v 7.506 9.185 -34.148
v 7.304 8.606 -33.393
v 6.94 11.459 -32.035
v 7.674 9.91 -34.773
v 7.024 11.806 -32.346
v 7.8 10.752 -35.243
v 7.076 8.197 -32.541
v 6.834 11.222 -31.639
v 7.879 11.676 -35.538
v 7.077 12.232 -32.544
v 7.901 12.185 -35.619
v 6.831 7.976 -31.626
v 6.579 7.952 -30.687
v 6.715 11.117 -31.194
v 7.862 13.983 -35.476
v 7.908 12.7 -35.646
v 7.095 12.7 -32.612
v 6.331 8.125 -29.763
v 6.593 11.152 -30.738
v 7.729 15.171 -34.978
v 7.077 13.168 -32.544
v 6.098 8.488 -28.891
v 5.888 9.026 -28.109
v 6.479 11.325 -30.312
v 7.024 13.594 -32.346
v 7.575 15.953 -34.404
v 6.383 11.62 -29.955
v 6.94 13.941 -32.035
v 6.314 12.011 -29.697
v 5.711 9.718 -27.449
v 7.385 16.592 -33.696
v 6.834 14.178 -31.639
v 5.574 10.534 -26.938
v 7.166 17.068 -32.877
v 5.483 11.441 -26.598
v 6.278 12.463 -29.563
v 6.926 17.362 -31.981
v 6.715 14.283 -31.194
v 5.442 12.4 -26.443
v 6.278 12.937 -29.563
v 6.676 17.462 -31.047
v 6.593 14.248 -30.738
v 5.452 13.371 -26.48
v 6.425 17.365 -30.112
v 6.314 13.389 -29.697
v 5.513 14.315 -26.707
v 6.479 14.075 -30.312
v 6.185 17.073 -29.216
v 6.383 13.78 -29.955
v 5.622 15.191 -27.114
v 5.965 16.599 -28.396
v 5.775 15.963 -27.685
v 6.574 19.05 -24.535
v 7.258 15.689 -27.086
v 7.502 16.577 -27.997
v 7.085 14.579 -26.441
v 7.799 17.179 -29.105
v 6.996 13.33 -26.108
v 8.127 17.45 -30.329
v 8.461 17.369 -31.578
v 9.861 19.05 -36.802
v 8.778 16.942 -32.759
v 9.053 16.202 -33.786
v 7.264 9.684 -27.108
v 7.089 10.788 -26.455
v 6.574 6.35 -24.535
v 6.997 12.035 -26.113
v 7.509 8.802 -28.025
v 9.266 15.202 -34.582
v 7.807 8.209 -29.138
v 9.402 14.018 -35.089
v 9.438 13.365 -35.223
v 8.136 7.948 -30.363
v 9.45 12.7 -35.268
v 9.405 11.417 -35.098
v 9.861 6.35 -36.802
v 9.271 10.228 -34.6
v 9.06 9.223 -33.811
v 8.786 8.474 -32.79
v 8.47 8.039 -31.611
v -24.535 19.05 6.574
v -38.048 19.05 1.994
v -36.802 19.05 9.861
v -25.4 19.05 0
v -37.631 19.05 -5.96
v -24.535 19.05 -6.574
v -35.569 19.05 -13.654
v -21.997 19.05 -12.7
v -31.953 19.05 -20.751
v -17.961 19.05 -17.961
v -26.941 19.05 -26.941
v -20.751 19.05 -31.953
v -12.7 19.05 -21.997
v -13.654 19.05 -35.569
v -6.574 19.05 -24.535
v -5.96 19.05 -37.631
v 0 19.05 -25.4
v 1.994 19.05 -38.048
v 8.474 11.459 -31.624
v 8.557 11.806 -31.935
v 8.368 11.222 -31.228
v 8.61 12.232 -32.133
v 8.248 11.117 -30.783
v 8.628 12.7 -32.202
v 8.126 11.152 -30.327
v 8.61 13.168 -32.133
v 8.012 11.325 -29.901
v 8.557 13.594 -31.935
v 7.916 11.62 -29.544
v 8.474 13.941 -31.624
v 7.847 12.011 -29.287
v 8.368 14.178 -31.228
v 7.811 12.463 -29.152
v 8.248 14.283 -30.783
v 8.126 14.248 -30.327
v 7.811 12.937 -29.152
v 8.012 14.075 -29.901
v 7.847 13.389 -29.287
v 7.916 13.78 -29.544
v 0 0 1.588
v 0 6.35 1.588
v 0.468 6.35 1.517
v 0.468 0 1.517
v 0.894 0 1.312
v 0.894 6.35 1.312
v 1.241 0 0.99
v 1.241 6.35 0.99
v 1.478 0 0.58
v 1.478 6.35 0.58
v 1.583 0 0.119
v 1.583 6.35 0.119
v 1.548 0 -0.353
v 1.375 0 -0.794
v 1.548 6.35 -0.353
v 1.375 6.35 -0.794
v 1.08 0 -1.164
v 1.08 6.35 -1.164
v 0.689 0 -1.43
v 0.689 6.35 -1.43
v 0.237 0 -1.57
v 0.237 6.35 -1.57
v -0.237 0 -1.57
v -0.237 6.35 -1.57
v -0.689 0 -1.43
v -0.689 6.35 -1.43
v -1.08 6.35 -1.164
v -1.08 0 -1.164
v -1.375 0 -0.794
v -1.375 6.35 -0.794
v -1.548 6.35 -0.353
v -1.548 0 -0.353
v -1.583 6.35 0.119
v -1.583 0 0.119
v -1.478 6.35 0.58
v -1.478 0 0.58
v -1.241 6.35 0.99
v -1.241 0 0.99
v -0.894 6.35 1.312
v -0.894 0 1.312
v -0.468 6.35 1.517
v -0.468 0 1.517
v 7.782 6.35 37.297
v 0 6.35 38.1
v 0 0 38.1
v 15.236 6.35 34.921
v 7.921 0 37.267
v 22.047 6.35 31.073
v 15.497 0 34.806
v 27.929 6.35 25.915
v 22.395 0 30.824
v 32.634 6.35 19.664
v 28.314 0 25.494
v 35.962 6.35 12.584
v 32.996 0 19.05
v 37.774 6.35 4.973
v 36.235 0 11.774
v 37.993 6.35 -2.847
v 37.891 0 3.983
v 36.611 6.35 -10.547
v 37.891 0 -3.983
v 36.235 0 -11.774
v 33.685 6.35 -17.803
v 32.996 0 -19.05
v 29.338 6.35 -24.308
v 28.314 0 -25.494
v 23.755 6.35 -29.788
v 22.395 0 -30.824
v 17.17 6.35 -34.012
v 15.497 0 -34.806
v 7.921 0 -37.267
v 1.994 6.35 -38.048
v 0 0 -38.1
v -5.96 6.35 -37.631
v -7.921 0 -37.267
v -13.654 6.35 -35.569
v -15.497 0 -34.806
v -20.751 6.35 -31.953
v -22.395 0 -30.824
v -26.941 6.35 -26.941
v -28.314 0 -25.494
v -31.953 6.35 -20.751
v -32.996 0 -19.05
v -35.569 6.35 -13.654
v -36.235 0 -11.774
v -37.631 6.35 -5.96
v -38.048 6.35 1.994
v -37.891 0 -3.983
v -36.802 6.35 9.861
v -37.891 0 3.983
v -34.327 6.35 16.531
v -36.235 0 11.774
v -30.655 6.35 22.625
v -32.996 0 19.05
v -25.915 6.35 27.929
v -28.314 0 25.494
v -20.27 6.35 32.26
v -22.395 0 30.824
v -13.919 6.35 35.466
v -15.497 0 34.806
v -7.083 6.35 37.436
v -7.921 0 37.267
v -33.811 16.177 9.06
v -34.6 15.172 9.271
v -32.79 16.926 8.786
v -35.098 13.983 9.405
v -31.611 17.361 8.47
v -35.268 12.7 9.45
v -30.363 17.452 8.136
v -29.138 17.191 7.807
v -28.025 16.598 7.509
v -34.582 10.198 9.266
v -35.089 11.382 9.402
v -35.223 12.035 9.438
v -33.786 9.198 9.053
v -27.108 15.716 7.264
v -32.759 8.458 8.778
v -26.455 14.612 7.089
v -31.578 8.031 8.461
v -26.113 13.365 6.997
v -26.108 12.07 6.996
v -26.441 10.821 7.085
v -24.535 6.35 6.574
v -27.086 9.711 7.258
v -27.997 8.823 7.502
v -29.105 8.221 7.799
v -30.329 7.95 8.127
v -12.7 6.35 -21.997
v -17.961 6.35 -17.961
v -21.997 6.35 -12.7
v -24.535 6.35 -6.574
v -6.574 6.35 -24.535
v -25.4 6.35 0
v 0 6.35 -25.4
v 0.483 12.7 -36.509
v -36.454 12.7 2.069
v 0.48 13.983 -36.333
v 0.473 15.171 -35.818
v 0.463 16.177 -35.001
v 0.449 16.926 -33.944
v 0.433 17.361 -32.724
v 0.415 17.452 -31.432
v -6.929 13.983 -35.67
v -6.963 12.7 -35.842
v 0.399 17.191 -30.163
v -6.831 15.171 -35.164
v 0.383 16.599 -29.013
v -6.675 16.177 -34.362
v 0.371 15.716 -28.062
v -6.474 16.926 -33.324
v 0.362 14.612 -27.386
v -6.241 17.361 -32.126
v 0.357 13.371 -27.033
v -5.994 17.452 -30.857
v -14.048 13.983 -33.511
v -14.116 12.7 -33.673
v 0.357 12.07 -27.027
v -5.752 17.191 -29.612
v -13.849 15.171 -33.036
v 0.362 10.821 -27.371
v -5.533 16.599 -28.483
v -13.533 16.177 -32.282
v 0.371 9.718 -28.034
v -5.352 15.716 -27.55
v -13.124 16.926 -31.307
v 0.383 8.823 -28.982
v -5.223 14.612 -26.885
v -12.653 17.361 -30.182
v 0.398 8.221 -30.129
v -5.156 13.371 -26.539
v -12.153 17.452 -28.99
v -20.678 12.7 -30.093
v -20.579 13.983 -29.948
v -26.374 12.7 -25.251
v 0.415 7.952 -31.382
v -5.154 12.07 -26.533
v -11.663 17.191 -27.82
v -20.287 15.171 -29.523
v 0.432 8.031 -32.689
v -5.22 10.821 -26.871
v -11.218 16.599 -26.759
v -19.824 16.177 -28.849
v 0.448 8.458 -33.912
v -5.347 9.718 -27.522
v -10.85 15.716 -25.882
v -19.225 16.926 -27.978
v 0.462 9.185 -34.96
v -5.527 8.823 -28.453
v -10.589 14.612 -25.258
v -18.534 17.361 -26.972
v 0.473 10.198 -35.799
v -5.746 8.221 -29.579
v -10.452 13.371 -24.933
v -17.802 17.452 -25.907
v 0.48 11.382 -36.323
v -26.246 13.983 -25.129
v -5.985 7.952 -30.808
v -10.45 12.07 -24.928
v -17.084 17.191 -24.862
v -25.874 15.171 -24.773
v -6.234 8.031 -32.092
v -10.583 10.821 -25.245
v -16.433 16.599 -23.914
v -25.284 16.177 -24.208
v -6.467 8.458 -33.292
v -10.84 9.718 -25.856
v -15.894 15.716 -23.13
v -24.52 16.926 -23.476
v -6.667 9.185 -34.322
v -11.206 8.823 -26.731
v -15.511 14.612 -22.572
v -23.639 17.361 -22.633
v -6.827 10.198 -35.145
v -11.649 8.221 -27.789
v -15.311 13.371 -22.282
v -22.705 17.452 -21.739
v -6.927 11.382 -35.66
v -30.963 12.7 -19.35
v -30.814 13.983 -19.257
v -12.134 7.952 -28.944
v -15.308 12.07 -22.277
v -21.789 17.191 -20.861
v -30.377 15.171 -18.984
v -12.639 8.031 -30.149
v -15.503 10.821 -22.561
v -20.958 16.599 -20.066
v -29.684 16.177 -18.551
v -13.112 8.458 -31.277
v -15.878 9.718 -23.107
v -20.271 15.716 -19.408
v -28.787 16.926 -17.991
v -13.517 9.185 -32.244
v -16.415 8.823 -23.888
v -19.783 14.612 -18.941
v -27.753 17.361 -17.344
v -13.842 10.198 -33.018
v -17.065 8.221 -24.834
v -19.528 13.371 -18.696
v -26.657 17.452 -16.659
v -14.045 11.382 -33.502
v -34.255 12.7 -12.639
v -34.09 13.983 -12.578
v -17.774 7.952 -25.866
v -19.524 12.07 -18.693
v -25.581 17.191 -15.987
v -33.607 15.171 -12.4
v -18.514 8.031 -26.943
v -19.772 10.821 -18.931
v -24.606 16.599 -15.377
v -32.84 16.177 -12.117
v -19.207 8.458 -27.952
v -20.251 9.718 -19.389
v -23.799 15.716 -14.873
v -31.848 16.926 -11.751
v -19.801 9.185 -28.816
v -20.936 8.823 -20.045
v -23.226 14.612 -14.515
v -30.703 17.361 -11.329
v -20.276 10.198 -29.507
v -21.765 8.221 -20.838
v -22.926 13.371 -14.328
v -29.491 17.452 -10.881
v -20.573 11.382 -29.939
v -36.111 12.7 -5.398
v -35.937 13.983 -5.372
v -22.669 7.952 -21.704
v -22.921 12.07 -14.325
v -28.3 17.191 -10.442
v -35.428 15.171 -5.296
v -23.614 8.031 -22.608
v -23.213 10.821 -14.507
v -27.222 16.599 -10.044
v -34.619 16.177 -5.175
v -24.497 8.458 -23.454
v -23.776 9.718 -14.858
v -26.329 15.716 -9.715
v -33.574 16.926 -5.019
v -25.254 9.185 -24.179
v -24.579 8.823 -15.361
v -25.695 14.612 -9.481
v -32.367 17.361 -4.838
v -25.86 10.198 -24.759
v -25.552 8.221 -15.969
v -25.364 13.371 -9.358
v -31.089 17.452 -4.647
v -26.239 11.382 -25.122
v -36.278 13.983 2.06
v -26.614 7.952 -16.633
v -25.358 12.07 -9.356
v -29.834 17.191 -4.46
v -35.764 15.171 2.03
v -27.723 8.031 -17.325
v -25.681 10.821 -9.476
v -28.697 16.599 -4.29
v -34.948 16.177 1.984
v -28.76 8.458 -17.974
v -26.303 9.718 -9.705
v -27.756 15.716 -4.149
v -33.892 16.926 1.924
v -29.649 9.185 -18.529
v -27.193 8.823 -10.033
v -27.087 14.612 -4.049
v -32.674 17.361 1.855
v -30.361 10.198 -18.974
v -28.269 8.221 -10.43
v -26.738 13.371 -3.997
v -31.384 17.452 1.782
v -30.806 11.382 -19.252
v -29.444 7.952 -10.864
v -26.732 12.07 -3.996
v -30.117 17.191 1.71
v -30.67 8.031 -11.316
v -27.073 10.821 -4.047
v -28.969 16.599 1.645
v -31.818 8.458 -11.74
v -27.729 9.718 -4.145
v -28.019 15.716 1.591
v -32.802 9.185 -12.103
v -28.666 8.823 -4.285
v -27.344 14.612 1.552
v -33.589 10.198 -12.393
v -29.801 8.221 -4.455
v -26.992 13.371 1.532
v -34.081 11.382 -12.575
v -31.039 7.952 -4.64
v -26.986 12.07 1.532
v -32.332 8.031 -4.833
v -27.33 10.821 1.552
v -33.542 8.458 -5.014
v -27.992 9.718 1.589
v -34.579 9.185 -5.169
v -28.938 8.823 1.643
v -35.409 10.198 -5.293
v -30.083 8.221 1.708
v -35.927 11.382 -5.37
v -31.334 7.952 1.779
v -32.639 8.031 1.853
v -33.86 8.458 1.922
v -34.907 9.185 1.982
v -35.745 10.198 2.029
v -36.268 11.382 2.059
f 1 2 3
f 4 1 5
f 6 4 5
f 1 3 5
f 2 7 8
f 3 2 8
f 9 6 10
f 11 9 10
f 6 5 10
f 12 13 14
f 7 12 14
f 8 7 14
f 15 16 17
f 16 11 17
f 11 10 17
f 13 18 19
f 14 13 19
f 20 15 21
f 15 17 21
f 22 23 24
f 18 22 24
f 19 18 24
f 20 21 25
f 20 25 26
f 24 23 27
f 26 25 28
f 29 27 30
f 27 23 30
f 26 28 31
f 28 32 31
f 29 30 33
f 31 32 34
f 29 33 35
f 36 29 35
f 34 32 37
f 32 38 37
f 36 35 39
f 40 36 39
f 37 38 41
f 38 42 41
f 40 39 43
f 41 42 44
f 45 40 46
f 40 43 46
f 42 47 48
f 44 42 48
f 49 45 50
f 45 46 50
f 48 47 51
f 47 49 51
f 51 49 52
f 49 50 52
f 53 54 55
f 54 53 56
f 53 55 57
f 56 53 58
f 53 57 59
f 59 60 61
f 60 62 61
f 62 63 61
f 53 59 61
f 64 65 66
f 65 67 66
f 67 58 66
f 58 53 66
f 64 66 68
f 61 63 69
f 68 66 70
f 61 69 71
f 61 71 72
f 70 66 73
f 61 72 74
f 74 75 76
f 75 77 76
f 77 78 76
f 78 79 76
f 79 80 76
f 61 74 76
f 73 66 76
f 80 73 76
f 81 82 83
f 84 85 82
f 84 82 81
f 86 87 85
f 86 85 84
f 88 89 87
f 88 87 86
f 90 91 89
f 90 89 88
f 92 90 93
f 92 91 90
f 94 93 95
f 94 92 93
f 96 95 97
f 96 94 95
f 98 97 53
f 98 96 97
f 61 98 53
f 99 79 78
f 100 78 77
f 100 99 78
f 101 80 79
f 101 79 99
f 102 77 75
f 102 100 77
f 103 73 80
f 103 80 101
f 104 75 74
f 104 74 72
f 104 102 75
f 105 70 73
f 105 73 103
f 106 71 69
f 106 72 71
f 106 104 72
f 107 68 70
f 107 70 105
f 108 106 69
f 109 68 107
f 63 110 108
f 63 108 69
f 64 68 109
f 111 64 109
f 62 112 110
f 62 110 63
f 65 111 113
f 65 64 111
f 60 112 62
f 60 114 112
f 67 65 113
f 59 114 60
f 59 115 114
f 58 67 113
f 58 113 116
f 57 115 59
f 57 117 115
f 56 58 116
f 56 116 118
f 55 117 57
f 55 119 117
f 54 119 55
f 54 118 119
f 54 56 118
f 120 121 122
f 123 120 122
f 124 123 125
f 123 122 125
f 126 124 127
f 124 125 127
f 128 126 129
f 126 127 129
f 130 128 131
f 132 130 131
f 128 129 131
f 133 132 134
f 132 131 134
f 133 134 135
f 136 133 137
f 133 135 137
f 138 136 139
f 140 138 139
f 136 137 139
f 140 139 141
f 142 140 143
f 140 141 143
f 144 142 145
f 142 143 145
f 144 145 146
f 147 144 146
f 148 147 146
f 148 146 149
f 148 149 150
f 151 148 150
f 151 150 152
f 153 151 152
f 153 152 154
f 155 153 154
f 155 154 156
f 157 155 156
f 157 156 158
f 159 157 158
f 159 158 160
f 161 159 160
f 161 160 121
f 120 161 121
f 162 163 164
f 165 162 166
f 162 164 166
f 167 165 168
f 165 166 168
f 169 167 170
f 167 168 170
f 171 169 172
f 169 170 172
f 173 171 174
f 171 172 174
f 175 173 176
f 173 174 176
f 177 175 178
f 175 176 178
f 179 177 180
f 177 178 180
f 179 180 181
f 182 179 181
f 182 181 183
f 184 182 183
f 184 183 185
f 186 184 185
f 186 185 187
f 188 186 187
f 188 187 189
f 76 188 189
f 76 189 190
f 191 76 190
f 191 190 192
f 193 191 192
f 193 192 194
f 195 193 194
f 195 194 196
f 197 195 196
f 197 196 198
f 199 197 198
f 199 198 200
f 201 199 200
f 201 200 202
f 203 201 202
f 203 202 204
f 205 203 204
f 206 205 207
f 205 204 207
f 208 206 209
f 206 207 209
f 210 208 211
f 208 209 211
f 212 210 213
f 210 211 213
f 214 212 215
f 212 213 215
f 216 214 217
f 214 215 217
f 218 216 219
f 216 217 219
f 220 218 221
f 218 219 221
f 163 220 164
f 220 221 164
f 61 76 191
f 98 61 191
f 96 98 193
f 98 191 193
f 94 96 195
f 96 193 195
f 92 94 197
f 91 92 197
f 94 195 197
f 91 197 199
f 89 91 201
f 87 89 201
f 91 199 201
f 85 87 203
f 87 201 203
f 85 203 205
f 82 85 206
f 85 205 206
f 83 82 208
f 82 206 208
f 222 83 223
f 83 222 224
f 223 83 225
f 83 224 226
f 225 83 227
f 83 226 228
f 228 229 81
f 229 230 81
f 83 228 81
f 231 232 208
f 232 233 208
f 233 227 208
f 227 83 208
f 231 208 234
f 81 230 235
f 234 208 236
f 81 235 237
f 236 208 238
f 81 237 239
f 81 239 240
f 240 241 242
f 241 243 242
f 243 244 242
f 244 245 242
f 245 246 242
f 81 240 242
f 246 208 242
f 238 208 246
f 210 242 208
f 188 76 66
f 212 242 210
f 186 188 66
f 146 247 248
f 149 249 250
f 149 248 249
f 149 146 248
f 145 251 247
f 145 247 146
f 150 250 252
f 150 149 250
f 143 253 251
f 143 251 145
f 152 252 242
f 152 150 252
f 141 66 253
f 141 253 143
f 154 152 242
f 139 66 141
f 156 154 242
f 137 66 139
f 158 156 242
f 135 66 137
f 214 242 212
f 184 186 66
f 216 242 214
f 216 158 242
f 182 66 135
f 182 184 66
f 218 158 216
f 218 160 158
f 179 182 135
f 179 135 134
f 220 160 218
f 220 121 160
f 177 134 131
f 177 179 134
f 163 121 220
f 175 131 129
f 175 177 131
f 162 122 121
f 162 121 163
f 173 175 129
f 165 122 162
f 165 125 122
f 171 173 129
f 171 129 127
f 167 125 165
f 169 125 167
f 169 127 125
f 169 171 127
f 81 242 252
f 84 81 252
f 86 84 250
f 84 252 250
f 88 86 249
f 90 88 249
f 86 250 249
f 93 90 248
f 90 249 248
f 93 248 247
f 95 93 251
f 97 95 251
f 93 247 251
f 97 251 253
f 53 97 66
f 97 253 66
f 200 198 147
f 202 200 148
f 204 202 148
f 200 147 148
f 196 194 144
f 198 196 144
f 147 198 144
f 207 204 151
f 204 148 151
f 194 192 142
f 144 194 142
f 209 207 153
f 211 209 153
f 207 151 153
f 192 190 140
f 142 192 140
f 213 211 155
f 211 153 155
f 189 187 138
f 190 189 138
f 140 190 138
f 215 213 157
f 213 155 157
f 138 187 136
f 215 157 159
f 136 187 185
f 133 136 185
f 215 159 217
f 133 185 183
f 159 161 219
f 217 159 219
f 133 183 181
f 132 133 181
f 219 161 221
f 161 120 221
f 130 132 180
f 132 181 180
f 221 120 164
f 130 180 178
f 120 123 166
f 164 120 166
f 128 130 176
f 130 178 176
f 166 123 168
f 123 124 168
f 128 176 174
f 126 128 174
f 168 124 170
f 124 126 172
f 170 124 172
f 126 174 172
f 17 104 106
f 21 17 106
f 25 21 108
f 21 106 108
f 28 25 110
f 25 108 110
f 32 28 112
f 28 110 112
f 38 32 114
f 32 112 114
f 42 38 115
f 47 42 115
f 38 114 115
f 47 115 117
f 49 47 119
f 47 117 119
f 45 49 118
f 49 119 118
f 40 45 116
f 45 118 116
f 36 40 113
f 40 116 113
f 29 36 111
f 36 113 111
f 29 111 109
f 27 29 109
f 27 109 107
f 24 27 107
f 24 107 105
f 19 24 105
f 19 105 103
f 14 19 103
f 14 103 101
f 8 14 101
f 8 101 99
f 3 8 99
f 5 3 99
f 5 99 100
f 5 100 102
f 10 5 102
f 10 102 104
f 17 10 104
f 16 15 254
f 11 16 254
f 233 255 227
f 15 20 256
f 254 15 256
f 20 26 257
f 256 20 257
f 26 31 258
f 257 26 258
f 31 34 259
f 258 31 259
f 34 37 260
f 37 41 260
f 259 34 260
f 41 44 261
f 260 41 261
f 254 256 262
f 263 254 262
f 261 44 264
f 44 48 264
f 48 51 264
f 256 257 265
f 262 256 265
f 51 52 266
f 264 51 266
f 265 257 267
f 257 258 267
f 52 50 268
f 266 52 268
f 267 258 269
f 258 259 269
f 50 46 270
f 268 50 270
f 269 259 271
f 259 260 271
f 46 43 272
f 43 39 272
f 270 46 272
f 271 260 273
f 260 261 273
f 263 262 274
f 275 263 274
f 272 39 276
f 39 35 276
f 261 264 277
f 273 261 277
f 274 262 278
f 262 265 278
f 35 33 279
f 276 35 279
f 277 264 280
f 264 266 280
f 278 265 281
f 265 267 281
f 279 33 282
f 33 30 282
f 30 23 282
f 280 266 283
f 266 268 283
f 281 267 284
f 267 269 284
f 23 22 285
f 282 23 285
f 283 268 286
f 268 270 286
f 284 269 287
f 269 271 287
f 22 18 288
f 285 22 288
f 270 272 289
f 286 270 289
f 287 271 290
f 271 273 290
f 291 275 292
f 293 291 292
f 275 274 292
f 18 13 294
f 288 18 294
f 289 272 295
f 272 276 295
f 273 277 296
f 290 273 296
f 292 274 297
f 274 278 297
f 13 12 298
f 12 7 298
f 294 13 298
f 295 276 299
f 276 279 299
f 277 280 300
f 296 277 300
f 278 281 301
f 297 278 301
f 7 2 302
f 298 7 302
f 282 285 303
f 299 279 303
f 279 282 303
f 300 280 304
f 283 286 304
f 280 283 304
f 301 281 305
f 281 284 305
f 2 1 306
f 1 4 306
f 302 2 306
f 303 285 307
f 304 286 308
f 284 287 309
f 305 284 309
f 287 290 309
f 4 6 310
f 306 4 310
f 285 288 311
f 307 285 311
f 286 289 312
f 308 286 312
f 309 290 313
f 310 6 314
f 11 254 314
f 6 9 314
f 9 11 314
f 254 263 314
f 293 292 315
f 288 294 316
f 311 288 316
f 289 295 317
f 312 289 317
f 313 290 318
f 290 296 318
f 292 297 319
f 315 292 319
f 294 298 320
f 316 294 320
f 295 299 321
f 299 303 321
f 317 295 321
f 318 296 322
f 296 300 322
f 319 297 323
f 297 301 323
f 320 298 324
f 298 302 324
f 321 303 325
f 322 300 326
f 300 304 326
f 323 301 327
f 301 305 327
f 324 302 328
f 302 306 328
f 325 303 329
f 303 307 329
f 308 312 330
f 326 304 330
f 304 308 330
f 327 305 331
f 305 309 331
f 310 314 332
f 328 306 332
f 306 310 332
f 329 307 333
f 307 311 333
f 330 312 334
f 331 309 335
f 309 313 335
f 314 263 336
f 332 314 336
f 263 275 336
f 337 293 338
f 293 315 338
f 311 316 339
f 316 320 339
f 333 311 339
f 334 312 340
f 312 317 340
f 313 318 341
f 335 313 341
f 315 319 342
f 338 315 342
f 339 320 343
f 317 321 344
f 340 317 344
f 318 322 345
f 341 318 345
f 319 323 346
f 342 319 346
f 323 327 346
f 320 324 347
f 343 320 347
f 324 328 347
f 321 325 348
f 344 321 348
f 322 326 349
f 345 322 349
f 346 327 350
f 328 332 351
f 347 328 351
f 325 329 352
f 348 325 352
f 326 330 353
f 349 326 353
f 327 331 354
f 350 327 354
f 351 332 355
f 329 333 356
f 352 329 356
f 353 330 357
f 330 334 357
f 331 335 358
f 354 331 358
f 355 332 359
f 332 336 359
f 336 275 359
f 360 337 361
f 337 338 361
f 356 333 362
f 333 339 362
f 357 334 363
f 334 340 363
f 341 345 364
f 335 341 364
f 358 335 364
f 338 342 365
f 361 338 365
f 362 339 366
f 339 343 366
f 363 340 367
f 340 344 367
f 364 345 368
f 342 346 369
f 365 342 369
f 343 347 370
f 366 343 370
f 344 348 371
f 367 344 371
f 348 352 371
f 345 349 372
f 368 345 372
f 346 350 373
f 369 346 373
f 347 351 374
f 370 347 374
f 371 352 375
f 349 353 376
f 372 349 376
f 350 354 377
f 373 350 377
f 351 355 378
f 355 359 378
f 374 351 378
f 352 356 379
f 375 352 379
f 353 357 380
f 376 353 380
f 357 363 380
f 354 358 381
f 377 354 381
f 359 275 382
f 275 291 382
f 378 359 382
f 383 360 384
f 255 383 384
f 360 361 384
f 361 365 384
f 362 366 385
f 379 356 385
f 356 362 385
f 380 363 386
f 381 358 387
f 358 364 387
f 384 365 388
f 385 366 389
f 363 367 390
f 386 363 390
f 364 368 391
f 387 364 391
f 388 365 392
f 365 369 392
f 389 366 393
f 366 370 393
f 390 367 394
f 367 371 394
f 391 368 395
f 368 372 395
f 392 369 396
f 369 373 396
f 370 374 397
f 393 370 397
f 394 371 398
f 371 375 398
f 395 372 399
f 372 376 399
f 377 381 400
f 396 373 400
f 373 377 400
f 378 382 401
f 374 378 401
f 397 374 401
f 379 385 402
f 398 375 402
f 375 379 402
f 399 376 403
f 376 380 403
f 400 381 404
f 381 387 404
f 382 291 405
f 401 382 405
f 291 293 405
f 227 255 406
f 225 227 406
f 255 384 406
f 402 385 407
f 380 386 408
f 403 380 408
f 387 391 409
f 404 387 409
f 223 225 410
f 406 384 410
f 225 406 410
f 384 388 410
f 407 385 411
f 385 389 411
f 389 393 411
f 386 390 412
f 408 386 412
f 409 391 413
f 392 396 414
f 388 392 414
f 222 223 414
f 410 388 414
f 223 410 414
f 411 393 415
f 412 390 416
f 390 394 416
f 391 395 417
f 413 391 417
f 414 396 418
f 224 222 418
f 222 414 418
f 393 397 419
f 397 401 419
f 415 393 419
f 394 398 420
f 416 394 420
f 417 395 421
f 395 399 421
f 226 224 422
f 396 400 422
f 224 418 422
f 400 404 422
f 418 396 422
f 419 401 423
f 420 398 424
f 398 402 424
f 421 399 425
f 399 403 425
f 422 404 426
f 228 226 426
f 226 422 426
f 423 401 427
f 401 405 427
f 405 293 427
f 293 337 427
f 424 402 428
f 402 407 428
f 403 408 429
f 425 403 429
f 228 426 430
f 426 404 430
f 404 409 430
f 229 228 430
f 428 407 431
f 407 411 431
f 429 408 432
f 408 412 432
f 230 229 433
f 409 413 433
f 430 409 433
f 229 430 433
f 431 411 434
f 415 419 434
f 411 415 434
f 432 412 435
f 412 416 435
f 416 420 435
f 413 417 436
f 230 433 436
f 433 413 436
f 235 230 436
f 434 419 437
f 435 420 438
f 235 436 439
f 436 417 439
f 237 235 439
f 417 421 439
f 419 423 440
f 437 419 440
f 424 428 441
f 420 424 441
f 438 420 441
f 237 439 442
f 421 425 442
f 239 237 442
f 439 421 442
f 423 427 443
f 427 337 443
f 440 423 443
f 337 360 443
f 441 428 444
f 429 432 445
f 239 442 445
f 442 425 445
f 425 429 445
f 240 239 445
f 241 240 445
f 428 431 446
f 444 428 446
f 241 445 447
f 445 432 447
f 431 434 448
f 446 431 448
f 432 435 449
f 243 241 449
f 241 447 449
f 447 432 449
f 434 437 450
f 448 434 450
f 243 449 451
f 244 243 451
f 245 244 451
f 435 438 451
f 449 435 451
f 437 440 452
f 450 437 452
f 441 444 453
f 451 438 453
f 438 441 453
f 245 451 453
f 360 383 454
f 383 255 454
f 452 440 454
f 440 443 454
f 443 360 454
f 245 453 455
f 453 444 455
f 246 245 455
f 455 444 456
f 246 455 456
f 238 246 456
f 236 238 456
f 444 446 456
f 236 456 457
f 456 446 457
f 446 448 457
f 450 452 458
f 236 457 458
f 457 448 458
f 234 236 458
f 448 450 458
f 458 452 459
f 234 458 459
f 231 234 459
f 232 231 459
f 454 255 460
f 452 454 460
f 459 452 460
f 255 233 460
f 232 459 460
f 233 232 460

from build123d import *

# Parameters (mm, degrees)
SKETCH1_R                = 38.1
BOSS_EXTRUDE1_DEPTH      = 6.35
BOSS_EXTRUDE2_DEPTH      = 12.7
CUT_REVOLVE1_OUTLINE_R   = 4.7625
CUT_REVOLVE1_START       = -1.5875
CUT_REVOLVE1_2_OUTLINE_W = 11
CUT_REVOLVE1_2_OUTLINE_H = 11
CUT_REVOLVE1_2_DEPTH     = 1.5875
CUT_EXTRUDE2_REACH       = 59.15
SKETCH5_R                = 1.5875
CUT_EXTRUDE3_REACH       = 57.358
SKETCH6_R                = 1.5875


with BuildPart() as part:
    # Sketch1 → Boss-Extrude1 (new body)
    with BuildSketch(Plane(origin=(0, 0, 0), x_dir=(1, 0, 0), z_dir=(0, 1, 0))):
        with Locations(Location((0, 0, 0), (0, 0, 270))):
            Circle(SKETCH1_R)
    extrude(amount=BOSS_EXTRUDE1_DEPTH)

    # Sketch2 → Boss-Extrude2 (add)
    with BuildSketch(Plane(origin=(0, 6.35, 0), x_dir=(1, 0, 0), z_dir=(0, 1, 0))):
        with BuildLine():
            ThreePointArc((9.861005618, 36.801773982), (-26.940768363, 26.940768363), (-36.801773982, -9.861005618))
            Line((-36.801773982, -9.861005618), (-24.534515988, -6.574003746))
            ThreePointArc((-24.534515988, -6.574003746), (-17.960512242, 17.960512242), (6.574003746, 24.534515988))
            Line((6.574003746, 24.534515988), (9.861005618, 36.801773982))
        make_face()
    extrude(amount=BOSS_EXTRUDE2_DEPTH)

    # Cut-Revolve1: read off the stored shape, not the designer's step
    # Cut-Revolve1 outline → Cut-Revolve1 (revolve, cut)
    with BuildSketch(Plane.XY):
        with Locations((31.75, 12.7)):
            Circle(CUT_REVOLVE1_OUTLINE_R)
    revolve(axis=Axis((0, 0, 0), (0, 1, 0)), mode=Mode.SUBTRACT)

    # Cut-Revolve1 2 outline → Cut-Revolve1 2 (add)
    with BuildSketch(Plane(origin=(0, 0, 0), x_dir=(0, 1, 0), z_dir=(0.9659258262890682, 0, 0.2588190451025211)).offset(CUT_REVOLVE1_START)):
        with Locations((12.5, -31.5)):
            Rectangle(CUT_REVOLVE1_2_OUTLINE_W, CUT_REVOLVE1_2_OUTLINE_H)
    extrude(amount=CUT_REVOLVE1_2_DEPTH)

    # Sketch5 → Cut-Extrude2 (cut, up to next)
    with BuildSketch(Plane(origin=(0, 0, 0), x_dir=(0.25881904510252135, 0, -0.9659258262890682), z_dir=(0.9659258262890681, 0, 0.2588190451025213)), mode=Mode.PRIVATE) as cut_extrude2_sk1:
        with Locations((31.75, 12.7)):
            Circle(SKETCH5_R)
    cut_extrude2_tool1 = extrude(cut_extrude2_sk1.sketch, amount=-CUT_EXTRUDE2_REACH, mode=Mode.PRIVATE) & part.part
    add(cut_extrude2_tool1.solids().sort_by_distance((8.217505, 12.7, -30.668145))[0], mode=Mode.SUBTRACT)

    # Sketch6 → Cut-Extrude3 (cut, up to next)
    with BuildSketch(Plane(origin=(0, 6.35, 0), x_dir=(1, 0, 0), z_dir=(0, 1, 0)), mode=Mode.PRIVATE) as cut_extrude3_sk1:
        with Locations(Location((0, 0, 0), (0, 0, 270))):
            Circle(SKETCH6_R)
    cut_extrude3_tool1 = extrude(cut_extrude3_sk1.sketch, amount=-CUT_EXTRUDE3_REACH, mode=Mode.PRIVATE) & part.part
    add(cut_extrude3_tool1.solids().sort_by_distance((0, 6.35, 0))[0], mode=Mode.SUBTRACT)


solid = part.part
